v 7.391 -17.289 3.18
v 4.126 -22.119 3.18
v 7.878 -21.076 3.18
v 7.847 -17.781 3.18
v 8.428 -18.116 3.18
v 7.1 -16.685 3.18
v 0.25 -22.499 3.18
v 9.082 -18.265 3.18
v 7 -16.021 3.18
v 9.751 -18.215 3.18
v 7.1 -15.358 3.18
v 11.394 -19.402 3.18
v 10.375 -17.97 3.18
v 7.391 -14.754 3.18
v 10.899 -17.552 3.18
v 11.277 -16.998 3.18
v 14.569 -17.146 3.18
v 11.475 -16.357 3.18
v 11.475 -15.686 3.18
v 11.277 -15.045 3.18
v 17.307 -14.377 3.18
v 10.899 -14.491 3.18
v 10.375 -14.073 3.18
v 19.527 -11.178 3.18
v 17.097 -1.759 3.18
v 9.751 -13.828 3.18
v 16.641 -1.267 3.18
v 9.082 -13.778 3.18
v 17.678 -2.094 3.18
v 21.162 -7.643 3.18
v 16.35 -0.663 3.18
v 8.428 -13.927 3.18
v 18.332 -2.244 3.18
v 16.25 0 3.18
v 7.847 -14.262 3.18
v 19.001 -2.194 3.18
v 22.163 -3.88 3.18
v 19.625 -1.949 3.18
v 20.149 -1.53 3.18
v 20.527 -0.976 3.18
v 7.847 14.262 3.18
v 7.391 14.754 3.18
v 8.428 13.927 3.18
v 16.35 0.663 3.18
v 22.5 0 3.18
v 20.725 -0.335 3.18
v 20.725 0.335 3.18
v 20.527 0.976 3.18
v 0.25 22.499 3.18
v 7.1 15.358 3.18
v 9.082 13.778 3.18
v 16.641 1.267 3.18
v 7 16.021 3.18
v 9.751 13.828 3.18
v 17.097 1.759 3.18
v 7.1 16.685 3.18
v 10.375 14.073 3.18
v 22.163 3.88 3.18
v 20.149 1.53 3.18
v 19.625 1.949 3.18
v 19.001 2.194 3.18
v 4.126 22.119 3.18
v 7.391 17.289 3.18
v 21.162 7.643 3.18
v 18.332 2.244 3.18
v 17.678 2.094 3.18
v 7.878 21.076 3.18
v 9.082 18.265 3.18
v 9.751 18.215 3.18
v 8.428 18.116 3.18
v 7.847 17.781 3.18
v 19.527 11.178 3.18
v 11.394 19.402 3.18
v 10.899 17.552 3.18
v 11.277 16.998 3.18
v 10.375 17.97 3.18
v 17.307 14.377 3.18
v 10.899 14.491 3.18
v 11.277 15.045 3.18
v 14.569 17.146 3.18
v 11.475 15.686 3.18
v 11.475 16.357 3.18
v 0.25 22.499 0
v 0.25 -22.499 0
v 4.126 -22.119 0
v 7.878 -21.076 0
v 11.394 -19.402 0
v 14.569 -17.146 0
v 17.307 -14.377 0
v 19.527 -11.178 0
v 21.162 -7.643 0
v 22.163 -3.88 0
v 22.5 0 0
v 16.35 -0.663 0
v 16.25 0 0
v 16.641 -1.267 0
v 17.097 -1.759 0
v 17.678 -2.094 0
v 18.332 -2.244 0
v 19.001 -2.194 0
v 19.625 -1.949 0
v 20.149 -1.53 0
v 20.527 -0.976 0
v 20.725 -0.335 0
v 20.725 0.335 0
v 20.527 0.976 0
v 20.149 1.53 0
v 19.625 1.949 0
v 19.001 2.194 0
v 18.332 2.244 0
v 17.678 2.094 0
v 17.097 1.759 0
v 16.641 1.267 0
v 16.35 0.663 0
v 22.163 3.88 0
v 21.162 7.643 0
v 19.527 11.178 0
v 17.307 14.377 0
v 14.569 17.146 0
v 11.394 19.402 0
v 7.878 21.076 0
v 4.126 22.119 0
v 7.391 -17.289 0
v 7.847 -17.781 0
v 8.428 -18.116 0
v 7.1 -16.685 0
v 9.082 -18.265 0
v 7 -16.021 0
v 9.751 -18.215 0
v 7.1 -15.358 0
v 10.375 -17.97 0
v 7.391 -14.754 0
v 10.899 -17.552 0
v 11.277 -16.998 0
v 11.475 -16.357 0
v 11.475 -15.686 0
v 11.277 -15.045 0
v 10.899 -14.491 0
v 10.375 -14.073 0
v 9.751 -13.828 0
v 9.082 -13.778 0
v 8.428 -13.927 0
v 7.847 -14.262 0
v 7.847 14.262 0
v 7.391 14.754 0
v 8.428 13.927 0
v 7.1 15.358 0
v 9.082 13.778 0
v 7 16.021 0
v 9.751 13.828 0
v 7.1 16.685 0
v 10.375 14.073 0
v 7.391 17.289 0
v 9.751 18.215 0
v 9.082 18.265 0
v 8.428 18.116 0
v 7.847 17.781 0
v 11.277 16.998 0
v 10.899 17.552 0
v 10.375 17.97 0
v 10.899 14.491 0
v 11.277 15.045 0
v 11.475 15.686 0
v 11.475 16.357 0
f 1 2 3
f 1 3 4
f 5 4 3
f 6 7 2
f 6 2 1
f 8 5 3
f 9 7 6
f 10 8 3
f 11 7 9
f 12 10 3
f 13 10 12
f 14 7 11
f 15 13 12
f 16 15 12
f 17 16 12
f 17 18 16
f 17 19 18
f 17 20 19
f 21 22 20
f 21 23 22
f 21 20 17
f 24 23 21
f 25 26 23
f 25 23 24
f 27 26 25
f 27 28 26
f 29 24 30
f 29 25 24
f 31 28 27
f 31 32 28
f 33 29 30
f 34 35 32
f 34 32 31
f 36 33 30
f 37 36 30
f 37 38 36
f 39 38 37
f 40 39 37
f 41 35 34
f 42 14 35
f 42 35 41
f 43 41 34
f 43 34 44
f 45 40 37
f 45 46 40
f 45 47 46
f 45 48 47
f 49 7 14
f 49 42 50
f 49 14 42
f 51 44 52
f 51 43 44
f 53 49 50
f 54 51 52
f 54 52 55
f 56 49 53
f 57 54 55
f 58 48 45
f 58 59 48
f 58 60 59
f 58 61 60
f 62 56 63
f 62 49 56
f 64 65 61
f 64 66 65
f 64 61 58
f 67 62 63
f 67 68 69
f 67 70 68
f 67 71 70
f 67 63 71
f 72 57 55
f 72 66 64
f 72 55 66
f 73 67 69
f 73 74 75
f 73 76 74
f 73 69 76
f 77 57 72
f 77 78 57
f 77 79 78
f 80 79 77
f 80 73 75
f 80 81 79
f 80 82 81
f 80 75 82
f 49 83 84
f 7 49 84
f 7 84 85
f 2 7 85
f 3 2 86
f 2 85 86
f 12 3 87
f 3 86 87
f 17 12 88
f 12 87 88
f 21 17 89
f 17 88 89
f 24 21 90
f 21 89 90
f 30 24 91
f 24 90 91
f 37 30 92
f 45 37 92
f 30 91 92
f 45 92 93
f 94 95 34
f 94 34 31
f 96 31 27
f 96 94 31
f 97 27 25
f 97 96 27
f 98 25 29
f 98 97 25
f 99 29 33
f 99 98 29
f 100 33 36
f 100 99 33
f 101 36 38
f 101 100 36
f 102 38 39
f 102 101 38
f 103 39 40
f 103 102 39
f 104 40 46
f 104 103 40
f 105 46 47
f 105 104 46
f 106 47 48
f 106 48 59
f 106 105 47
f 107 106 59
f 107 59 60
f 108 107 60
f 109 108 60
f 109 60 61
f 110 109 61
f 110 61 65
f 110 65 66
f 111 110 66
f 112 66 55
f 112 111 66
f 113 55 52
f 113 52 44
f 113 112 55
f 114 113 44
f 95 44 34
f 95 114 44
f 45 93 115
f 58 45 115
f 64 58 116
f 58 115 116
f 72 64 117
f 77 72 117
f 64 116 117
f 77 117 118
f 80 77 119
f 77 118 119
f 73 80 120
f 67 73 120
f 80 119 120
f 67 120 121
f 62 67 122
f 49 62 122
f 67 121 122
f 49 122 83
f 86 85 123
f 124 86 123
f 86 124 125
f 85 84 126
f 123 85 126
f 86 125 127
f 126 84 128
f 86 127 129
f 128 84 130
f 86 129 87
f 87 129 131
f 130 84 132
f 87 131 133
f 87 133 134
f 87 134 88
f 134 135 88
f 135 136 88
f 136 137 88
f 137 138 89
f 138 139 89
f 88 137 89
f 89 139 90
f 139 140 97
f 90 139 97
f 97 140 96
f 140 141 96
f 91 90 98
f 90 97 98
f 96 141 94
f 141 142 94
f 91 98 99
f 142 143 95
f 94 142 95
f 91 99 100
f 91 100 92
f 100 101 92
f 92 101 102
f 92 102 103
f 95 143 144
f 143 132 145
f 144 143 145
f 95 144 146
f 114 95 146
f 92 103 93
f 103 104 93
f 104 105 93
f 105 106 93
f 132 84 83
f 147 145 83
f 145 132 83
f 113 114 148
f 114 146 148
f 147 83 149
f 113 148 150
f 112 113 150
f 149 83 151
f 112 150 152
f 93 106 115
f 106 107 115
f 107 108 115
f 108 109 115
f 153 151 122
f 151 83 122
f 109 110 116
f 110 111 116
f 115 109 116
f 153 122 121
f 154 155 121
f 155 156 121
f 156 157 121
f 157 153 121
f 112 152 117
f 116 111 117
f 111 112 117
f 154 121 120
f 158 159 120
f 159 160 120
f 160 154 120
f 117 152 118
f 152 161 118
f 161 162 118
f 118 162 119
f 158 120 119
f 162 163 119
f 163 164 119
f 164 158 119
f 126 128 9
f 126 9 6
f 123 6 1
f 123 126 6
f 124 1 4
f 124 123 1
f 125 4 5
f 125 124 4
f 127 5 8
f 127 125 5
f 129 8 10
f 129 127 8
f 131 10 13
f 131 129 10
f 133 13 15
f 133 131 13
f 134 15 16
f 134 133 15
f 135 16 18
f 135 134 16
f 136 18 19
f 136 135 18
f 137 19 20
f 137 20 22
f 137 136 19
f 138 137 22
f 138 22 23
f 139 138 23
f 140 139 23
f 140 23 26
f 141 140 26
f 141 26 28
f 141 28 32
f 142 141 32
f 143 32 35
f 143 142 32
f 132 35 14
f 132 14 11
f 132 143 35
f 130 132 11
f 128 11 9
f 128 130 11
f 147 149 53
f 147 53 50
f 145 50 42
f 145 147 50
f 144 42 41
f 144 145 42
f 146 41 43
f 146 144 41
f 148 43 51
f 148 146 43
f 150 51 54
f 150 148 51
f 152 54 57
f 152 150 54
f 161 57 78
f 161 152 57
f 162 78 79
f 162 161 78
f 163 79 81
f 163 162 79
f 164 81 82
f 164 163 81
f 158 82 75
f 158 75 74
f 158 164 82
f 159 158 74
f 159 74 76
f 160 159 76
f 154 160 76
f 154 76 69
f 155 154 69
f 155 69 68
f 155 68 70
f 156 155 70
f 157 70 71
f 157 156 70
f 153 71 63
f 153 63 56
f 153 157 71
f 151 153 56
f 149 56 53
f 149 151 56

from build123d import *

# Parameters (mm, degrees)
SKETCH1_R           = 2.25
BOSS_EXTRUDE1_DEPTH = 3.18


with BuildPart() as part:
    # Sketch1 → Boss-Extrude1 (new body)
    with BuildSketch(Plane.XY):
        with BuildLine():
            ThreePointArc((22.5, 0), (15.998046756, 15.821267332), (0.25, 22.498611068))
            Line((0.25, 22.498611068), (0.25, -22.498611068))
            ThreePointArc((0.25, -22.498611068), (15.998046756, -15.821267332), (22.5, 0))
        make_face()
        with Locations(Location((9.25, -16.02146997, 0), (0, 0, 180))):
            Circle(SKETCH1_R, mode=Mode.SUBTRACT)
        with Locations(Location((18.5, 0, 0), (0, 0, 180))):
            Circle(SKETCH1_R, mode=Mode.SUBTRACT)
        with Locations(Location((9.25, 16.02146997, 0), (0, 0, 180))):
            Circle(SKETCH1_R, mode=Mode.SUBTRACT)
    extrude(amount=BOSS_EXTRUDE1_DEPTH)


solid = part.part
